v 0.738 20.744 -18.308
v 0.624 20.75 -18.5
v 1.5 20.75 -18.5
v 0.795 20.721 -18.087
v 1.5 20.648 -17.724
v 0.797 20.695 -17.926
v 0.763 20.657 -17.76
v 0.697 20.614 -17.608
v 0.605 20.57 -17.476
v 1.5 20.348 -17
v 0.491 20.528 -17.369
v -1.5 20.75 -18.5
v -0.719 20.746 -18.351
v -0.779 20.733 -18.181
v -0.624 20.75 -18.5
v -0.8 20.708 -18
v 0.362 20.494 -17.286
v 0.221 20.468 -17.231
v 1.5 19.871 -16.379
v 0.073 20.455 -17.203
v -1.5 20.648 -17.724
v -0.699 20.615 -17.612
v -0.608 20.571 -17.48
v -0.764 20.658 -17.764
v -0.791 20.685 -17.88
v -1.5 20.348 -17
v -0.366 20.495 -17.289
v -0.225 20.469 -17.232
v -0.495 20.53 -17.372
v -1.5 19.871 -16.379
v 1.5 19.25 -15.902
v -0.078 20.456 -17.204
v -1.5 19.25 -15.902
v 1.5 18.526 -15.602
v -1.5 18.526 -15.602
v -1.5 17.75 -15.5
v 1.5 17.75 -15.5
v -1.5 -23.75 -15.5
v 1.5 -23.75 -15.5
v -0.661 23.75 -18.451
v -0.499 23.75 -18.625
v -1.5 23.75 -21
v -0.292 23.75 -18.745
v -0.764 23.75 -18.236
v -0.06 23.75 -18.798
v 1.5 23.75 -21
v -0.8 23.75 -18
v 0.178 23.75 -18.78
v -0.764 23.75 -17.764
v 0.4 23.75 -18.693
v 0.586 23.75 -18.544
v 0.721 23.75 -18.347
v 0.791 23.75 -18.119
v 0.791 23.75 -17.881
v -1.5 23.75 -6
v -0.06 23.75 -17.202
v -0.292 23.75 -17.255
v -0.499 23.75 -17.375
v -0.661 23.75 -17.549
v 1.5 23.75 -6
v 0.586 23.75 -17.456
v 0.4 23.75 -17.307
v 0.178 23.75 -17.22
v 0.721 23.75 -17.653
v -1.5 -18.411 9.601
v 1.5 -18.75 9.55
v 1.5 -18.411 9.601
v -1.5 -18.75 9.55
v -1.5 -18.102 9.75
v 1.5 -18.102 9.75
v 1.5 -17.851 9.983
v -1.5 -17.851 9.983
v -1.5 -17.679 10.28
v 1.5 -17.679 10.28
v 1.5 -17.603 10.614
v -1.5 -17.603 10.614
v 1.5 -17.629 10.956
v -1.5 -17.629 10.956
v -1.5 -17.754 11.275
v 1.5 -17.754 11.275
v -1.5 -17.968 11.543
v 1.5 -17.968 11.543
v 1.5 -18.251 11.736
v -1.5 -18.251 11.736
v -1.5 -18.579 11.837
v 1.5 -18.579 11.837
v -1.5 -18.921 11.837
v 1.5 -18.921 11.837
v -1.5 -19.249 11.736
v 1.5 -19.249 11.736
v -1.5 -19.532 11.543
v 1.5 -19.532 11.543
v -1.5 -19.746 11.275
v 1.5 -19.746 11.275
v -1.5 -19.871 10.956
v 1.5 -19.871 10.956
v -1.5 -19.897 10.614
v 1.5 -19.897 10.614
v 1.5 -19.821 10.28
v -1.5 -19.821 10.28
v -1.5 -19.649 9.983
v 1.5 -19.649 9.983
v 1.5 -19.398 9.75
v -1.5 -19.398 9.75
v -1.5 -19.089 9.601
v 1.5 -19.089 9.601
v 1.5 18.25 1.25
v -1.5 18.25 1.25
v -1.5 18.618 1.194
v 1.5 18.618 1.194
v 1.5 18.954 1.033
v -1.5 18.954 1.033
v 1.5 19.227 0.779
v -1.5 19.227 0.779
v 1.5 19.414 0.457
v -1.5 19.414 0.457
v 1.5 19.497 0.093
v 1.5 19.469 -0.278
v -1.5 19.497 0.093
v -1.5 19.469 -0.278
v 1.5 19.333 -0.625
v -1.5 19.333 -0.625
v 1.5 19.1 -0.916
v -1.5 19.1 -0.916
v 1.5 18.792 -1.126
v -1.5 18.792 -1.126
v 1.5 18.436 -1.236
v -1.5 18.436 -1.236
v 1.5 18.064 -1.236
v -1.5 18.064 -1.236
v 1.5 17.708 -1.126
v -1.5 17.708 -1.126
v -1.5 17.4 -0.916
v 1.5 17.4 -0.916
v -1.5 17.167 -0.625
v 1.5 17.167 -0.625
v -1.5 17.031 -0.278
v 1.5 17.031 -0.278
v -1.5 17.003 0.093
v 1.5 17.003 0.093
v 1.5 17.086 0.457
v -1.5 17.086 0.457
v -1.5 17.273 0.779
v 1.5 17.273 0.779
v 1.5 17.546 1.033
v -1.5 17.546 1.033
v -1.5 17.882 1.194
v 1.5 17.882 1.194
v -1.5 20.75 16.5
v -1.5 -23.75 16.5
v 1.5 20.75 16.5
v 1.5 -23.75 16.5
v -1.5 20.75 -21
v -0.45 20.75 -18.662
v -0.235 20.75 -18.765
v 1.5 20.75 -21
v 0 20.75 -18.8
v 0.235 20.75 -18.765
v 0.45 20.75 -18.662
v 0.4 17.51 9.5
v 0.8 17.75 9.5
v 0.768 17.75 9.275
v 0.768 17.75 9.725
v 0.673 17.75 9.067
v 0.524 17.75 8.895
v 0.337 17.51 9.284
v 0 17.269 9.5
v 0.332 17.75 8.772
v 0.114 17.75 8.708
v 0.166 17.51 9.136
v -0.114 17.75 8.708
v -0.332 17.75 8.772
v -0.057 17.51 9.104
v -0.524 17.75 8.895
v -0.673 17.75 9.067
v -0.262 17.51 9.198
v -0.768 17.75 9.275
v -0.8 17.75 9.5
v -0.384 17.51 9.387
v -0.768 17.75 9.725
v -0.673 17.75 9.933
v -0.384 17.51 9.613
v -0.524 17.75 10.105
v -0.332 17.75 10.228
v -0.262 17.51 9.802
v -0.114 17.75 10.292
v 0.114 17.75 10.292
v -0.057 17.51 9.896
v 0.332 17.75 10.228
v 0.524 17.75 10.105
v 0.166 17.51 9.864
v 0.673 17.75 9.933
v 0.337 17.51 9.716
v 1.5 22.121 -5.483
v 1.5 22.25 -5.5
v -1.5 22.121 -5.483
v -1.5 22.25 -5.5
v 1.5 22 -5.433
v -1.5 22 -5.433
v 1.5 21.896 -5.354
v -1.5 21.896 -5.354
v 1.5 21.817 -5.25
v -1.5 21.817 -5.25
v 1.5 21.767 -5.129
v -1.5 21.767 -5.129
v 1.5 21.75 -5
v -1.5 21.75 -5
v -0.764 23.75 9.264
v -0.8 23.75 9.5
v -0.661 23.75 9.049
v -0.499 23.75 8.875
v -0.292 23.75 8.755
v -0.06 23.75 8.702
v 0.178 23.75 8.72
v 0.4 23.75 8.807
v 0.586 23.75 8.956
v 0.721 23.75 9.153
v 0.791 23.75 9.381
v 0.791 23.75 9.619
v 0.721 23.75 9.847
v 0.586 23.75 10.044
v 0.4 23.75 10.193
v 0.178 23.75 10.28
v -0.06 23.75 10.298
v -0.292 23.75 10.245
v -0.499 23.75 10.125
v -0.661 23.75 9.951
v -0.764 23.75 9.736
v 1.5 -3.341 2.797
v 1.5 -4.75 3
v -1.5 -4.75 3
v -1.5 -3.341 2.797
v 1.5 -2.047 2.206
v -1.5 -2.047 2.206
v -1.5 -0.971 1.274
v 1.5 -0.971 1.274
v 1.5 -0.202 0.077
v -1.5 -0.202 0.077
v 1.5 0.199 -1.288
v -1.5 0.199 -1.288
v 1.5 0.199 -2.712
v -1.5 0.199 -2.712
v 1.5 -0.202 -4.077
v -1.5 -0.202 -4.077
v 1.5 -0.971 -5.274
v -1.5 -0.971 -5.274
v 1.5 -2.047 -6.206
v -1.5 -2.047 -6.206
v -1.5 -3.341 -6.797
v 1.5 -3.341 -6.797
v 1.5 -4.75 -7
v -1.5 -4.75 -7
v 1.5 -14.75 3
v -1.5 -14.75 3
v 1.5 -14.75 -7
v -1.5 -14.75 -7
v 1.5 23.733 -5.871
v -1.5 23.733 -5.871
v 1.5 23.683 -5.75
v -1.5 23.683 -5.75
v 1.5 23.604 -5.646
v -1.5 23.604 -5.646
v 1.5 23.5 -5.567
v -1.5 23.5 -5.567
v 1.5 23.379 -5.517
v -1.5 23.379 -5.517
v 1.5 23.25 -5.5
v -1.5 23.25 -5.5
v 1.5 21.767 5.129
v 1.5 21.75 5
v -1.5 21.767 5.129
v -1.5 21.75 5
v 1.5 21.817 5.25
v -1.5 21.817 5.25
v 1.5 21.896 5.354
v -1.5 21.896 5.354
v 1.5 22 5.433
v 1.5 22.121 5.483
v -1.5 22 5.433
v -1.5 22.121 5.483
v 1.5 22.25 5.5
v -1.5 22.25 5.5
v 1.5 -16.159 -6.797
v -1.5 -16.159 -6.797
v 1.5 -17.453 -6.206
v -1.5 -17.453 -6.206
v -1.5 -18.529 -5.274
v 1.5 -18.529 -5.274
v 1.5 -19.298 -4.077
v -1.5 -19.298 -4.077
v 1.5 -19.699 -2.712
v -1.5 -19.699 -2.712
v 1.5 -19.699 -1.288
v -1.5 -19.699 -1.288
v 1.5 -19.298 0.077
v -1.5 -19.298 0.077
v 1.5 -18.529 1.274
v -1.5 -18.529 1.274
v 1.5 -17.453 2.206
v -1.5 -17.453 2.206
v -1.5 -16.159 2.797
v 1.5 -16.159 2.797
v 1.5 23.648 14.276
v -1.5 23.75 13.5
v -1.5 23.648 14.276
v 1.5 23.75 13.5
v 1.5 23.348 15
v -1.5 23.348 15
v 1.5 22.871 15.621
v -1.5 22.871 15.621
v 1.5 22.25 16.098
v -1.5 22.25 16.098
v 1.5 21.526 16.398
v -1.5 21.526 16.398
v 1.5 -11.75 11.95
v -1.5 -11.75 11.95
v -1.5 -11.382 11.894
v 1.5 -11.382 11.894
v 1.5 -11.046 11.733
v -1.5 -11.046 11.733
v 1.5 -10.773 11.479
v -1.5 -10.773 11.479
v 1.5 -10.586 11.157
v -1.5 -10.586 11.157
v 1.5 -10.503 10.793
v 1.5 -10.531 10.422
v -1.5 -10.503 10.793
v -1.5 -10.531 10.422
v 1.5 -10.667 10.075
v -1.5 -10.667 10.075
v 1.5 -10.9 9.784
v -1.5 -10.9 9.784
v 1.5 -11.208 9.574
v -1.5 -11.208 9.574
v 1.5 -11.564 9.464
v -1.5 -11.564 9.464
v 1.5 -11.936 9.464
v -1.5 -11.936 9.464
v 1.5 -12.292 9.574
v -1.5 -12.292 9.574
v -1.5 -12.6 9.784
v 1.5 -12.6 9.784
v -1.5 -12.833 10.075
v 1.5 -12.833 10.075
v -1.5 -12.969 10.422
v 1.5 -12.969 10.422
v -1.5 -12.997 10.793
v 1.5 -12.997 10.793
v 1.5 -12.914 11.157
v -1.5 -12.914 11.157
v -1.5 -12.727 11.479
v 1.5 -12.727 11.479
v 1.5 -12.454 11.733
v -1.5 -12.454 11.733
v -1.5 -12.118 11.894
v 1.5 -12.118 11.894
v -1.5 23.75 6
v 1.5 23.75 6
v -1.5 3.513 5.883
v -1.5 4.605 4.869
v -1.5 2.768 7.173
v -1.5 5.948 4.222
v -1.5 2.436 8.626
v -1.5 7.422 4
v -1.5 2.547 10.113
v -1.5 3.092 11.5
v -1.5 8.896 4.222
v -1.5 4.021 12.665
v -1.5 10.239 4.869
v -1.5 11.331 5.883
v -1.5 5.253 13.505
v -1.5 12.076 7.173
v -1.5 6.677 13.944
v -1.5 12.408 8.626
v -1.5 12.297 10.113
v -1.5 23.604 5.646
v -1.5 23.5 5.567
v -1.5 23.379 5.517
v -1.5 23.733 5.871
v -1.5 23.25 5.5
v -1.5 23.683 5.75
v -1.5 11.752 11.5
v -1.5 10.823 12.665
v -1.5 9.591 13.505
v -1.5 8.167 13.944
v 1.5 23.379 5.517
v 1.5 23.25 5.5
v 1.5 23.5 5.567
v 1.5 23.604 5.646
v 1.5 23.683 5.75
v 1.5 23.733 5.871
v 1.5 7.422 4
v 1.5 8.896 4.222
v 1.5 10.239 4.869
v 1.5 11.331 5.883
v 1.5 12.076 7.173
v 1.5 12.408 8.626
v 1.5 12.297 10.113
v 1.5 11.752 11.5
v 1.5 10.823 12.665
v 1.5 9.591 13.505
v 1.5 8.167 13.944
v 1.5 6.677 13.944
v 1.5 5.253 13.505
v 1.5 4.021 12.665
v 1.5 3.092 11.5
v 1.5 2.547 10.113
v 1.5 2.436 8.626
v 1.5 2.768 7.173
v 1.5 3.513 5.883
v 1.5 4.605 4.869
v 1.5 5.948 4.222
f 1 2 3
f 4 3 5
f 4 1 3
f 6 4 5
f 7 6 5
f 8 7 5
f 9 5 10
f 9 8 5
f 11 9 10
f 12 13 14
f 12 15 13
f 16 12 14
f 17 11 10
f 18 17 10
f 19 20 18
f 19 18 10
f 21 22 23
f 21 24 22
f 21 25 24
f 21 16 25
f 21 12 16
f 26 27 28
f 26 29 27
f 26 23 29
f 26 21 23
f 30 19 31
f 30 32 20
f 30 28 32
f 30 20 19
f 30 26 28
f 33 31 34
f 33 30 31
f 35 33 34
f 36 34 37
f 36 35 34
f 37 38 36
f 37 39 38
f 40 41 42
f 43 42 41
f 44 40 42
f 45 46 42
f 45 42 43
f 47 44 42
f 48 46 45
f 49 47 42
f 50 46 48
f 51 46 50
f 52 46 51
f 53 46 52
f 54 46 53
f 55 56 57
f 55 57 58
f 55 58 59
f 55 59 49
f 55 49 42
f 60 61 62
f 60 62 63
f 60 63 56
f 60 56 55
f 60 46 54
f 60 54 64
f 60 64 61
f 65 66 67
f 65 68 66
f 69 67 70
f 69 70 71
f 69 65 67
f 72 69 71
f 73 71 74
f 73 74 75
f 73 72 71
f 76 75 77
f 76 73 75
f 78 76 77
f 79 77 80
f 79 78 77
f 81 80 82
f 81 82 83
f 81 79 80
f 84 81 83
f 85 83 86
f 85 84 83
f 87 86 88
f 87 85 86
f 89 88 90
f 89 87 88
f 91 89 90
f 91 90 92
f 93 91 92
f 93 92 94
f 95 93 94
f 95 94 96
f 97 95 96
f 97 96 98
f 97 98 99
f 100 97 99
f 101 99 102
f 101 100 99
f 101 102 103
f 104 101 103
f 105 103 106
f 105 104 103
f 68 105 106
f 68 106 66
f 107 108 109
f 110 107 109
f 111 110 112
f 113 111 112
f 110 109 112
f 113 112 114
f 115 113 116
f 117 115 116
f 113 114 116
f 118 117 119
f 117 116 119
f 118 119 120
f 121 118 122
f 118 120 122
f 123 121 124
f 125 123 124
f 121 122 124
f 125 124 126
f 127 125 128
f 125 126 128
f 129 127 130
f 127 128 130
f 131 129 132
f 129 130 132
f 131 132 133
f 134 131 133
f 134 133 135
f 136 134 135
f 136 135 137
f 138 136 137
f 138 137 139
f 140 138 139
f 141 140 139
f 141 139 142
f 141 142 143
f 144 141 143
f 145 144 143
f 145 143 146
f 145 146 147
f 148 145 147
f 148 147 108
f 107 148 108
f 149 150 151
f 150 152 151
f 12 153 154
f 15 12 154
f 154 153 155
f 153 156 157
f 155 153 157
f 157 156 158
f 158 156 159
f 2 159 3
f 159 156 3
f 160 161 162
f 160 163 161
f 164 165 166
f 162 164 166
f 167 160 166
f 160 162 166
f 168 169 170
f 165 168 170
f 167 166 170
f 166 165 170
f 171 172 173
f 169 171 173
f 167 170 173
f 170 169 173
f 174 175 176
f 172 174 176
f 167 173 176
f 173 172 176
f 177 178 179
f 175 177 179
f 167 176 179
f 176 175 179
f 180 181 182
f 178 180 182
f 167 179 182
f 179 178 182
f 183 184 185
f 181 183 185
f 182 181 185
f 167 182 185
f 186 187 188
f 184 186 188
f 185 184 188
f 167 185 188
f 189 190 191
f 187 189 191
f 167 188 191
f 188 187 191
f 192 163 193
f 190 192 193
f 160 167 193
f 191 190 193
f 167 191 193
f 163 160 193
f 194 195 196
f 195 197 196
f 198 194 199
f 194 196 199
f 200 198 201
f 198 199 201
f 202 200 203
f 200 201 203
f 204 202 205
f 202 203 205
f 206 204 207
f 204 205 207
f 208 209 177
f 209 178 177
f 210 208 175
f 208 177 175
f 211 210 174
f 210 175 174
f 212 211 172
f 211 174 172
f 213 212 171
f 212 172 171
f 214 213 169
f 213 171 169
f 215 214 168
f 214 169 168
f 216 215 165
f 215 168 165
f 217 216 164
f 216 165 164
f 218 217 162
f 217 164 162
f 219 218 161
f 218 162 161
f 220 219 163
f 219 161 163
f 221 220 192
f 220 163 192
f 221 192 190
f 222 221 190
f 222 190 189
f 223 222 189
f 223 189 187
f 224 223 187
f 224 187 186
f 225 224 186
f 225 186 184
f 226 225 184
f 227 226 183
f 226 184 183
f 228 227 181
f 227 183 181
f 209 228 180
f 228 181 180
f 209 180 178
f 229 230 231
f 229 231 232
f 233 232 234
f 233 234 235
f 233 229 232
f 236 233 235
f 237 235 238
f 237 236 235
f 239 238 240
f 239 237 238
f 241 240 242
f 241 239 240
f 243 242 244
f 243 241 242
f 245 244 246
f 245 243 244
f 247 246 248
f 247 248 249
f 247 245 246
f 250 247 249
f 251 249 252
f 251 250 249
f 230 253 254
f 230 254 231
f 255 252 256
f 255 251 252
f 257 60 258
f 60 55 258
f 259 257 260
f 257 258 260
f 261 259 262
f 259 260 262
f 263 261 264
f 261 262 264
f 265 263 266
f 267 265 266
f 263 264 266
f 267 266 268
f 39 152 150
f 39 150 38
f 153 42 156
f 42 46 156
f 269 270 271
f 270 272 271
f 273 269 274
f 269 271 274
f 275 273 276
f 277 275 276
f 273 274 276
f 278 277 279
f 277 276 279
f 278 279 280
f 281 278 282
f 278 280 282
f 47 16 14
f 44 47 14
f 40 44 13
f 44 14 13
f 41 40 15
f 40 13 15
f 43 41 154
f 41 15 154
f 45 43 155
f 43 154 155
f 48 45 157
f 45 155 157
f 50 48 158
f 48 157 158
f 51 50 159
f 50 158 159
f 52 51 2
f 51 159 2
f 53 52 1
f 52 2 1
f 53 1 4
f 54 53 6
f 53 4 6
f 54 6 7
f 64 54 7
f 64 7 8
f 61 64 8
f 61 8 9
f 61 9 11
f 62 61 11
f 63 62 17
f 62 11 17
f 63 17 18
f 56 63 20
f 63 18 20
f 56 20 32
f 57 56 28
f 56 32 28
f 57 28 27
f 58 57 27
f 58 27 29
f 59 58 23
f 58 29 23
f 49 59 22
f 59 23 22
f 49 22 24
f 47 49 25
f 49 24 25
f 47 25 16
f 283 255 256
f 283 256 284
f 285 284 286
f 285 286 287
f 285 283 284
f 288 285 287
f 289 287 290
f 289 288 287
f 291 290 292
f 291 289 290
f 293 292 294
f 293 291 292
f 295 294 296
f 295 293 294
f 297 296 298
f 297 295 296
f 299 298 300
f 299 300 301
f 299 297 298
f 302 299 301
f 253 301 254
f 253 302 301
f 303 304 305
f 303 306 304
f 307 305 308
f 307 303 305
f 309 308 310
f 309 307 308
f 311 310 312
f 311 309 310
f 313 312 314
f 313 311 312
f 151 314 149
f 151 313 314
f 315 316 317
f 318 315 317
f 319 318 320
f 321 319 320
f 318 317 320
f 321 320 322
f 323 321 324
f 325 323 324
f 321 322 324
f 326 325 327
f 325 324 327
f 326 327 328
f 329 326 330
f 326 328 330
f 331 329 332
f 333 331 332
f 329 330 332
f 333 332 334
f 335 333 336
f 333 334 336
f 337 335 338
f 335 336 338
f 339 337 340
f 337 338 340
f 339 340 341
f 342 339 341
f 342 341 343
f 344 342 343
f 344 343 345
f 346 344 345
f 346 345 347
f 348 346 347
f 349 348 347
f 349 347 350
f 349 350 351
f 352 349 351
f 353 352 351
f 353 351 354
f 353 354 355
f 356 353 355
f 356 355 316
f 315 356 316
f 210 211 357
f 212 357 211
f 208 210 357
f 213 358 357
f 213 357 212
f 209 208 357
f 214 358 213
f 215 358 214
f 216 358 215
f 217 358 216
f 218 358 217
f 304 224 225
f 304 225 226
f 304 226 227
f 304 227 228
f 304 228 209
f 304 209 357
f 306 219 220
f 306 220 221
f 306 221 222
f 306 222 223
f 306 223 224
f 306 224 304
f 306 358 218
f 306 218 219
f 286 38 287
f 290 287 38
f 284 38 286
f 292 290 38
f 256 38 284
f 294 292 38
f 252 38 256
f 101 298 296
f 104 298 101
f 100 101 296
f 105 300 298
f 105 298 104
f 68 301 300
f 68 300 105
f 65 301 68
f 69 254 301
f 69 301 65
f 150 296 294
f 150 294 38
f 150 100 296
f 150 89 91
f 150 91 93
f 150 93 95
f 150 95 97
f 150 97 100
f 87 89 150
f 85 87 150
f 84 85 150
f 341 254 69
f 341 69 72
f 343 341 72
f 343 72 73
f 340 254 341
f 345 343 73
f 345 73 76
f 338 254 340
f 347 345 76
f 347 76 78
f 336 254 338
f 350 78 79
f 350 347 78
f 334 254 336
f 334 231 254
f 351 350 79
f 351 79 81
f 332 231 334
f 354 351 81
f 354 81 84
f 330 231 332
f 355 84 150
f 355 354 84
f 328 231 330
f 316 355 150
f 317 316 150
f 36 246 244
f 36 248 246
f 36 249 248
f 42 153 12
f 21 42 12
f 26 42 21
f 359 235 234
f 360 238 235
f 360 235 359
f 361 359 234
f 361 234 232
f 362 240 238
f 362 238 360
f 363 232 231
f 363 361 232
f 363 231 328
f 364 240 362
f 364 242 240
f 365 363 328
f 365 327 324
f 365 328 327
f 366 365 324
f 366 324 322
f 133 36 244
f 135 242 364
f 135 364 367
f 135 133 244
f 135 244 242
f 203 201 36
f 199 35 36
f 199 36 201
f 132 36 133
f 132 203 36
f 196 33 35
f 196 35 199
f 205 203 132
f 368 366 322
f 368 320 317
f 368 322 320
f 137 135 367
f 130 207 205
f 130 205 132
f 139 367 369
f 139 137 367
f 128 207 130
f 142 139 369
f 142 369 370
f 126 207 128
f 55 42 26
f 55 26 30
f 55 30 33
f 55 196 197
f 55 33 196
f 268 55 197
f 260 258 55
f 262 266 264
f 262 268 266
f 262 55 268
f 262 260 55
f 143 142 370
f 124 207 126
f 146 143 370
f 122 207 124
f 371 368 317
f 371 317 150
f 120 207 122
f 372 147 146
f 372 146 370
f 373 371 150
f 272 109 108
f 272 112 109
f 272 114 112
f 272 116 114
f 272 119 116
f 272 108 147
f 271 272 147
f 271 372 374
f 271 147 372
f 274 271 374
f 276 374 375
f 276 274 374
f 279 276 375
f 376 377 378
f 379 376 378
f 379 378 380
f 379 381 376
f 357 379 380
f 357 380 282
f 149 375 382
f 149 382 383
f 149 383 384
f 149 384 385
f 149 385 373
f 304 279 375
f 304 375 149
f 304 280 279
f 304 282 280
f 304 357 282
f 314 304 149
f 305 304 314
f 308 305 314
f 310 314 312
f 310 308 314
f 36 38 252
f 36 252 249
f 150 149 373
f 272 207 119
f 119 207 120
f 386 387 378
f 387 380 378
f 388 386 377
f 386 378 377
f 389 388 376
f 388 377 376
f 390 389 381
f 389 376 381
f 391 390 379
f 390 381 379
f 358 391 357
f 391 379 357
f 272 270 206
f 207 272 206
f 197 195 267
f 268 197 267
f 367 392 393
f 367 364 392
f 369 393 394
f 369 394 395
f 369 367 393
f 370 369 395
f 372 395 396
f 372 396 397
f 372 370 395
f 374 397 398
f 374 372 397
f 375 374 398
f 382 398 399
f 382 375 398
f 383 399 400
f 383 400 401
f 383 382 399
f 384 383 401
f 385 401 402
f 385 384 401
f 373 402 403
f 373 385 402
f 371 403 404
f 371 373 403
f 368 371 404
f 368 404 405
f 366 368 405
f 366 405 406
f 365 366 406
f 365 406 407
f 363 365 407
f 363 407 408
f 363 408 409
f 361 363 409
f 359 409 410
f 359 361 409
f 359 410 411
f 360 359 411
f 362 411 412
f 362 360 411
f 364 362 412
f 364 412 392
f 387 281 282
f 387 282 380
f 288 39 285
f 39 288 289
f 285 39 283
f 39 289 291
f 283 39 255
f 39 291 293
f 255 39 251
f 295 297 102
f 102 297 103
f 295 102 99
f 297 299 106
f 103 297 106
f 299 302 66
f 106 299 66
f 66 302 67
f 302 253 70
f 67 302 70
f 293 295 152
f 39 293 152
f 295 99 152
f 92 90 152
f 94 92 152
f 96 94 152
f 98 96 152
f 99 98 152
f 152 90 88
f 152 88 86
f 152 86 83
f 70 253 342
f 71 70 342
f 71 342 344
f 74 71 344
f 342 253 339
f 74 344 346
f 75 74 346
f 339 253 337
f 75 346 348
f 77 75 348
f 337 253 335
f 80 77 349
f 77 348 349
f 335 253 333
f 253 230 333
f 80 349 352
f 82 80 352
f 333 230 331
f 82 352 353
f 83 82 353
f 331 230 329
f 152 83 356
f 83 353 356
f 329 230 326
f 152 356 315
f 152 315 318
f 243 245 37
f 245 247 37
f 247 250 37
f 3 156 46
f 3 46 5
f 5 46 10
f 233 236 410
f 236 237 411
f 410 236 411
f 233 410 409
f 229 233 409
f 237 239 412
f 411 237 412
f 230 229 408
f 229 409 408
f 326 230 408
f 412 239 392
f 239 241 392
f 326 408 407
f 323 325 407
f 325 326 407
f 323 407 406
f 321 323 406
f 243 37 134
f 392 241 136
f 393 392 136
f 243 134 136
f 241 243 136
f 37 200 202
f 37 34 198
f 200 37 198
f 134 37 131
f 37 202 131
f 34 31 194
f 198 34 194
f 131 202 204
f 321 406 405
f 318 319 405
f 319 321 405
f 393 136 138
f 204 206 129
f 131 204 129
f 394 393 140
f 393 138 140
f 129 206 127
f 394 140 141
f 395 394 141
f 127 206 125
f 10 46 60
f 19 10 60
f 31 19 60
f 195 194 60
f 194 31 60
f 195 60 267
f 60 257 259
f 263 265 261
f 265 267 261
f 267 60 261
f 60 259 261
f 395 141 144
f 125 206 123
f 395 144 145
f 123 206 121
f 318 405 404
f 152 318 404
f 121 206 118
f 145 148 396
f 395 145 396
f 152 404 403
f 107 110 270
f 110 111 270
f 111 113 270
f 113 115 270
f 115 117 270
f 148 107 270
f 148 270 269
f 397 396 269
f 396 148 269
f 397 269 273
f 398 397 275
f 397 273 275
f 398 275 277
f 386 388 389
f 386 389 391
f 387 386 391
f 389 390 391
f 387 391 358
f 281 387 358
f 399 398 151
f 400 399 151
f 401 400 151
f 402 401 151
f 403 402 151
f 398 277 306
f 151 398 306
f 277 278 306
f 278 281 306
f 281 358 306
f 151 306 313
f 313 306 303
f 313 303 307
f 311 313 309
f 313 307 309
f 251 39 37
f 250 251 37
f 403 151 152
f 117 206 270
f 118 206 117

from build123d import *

# Parameters (mm, degrees)
SKETCH1_R                   = 5
SKETCH1_R_2                 = 1.15
BOSS_EXTRUDE1_DEPTH         = 1.5
FILLET1_R                   = 3
TAP_DRILL_FOR_M2_TAP1_D     = 1.6
TAP_DRILL_FOR_M2_TAP1_DEPTH = 6
TAP_DRILL_FOR_M2_TAP1_TIP   = 0.480688495
TAP_DRILL_FOR_M3_TAP1_D     = 2.5
SKETCH10_W                  = 11
SKETCH10_H                  = 2
CUT_EXTRUDE2_DEPTH          = 32.844348091
FILLET3_R                   = 0.5


with BuildPart() as part:
    # Sketch1 → Boss-Extrude1 (new, symmetric)
    with BuildSketch(Plane(origin=(0, 0, 0), x_dir=(0, 0, -1), z_dir=(1, 0, 0))):
        Polygon((-15.5, 23.75), (15.5, 23.75), (21, 23.75), (21, 20.75), (15.5, 20.75), (15.5, 8.25), (15.5, -23.75), (-15.5, -23.75), (-16.5, -23.75), (-16.5, 23.75), align=None)
        with Locations((-9, 7.422)):
            Circle(SKETCH1_R, mode=Mode.SUBTRACT)
        with Locations((-10.7, -18.75)):
            Circle(SKETCH1_R_2, mode=Mode.SUBTRACT)
        with BuildLine():
            Line((7, -4.75), (7, -14.75))
            ThreePointArc((7, -14.75), (2, -19.75), (-3, -14.75))
            Line((-3, -14.75), (-3, -4.75))
            ThreePointArc((-3, -4.75), (2, 0.25), (7, -4.75))
        make_face(mode=Mode.SUBTRACT)
    extrude(amount=BOSS_EXTRUDE1_DEPTH, both=True)

    # Fillet1
    fillet1_edges = [part.edges().sort_by_distance(p)[0] for p in [
        (0, 23.75, 16.5),
        (0, 20.75, -15.5),
    ]]
    fillet(fillet1_edges, radius=FILLET1_R)

    # Tap Drill for M2 Tap1
    with Locations(Plane(origin=(0, 23.75, 0), x_dir=(1, 0, 0), z_dir=(0, 1, 0))):
        with Locations((0, -9.5), (0, 18)):
            Hole(TAP_DRILL_FOR_M2_TAP1_D / 2, depth=TAP_DRILL_FOR_M2_TAP1_DEPTH)
            with Locations((0, 0, -(TAP_DRILL_FOR_M2_TAP1_DEPTH + TAP_DRILL_FOR_M2_TAP1_TIP / 2))):  # 118° drill point
                Cone(0, TAP_DRILL_FOR_M2_TAP1_D / 2, TAP_DRILL_FOR_M2_TAP1_TIP, mode=Mode.SUBTRACT)

    # Tap Drill for M3 Tap1 (through all)
    with Locations(Plane(origin=(1.5, 0, 0), x_dir=(0, 0, -1), z_dir=(1, 0, 0))):
        with Locations((-10.7, -11.75), (0, 18.25)):
            Hole(TAP_DRILL_FOR_M3_TAP1_D / 2)

    # Sketch10 → Cut-Extrude2 (cut, through all)
    with BuildSketch(Plane(origin=(1.5, 0, 0), x_dir=(0, 0, -1), z_dir=(1, 0, 0))):
        with Locations((0, 22.75)):
            Rectangle(SKETCH10_W, SKETCH10_H)
    extrude(amount=-CUT_EXTRUDE2_DEPTH, mode=Mode.SUBTRACT)

    # Fillet3
    fillet3_edges = [part.edges().sort_by_distance(p)[0] for p in [
        (0, 21.75, 5.5),
        (0, 23.75, 5.5),
        (0, 23.75, -5.5),
        (0, 21.75, -5.5),
    ]]
    fillet(fillet3_edges, radius=FILLET3_R)


solid = part.part
